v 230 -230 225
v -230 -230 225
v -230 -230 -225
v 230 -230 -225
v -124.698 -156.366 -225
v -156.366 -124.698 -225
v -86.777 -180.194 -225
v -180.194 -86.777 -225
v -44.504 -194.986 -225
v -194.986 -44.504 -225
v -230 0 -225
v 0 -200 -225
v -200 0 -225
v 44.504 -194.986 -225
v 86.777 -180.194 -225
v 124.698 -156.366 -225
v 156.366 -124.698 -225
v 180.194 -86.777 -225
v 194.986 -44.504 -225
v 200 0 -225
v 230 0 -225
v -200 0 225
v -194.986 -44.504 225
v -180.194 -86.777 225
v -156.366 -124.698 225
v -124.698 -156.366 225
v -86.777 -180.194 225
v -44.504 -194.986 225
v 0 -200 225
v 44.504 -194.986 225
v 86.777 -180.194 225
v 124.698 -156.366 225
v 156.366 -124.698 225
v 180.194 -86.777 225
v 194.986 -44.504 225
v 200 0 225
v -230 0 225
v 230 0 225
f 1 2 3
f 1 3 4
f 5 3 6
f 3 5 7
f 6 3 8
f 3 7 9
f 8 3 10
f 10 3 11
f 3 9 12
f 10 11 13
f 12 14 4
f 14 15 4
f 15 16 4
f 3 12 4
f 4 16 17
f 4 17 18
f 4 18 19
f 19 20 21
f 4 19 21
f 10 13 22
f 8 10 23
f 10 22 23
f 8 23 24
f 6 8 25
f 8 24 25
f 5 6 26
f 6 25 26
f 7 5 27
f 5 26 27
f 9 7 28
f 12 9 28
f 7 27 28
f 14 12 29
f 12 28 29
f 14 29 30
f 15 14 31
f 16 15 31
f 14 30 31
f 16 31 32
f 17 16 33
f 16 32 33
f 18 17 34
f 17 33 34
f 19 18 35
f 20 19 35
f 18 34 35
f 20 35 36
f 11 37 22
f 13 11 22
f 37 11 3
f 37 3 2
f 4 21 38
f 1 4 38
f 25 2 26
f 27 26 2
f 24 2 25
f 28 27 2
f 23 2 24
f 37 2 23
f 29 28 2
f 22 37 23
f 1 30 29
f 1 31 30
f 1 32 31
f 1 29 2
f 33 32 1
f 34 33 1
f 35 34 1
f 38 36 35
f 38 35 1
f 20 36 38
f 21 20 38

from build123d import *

# Parameters (mm, degrees)
F0_R     = 200
F1_DEPTH = 225
F2_W     = 460
F2_H     = 450
F3_DEPTH = 230


with BuildPart() as f1:
    # F0 (on Top) → F1 (new body, symmetric)
    with BuildSketch(Plane.XY):
        Circle(F0_R)
    extrude(amount=F1_DEPTH, both=True)


with BuildPart() as f3:
    # F2 (on Front) → F3 (new body)
    with BuildSketch(Plane.XZ):
        Rectangle(F2_W, F2_H)
    extrude(amount=F3_DEPTH)

    # F4: cut F1
    add(f1.part, mode=Mode.SUBTRACT)


solid = f3.part
